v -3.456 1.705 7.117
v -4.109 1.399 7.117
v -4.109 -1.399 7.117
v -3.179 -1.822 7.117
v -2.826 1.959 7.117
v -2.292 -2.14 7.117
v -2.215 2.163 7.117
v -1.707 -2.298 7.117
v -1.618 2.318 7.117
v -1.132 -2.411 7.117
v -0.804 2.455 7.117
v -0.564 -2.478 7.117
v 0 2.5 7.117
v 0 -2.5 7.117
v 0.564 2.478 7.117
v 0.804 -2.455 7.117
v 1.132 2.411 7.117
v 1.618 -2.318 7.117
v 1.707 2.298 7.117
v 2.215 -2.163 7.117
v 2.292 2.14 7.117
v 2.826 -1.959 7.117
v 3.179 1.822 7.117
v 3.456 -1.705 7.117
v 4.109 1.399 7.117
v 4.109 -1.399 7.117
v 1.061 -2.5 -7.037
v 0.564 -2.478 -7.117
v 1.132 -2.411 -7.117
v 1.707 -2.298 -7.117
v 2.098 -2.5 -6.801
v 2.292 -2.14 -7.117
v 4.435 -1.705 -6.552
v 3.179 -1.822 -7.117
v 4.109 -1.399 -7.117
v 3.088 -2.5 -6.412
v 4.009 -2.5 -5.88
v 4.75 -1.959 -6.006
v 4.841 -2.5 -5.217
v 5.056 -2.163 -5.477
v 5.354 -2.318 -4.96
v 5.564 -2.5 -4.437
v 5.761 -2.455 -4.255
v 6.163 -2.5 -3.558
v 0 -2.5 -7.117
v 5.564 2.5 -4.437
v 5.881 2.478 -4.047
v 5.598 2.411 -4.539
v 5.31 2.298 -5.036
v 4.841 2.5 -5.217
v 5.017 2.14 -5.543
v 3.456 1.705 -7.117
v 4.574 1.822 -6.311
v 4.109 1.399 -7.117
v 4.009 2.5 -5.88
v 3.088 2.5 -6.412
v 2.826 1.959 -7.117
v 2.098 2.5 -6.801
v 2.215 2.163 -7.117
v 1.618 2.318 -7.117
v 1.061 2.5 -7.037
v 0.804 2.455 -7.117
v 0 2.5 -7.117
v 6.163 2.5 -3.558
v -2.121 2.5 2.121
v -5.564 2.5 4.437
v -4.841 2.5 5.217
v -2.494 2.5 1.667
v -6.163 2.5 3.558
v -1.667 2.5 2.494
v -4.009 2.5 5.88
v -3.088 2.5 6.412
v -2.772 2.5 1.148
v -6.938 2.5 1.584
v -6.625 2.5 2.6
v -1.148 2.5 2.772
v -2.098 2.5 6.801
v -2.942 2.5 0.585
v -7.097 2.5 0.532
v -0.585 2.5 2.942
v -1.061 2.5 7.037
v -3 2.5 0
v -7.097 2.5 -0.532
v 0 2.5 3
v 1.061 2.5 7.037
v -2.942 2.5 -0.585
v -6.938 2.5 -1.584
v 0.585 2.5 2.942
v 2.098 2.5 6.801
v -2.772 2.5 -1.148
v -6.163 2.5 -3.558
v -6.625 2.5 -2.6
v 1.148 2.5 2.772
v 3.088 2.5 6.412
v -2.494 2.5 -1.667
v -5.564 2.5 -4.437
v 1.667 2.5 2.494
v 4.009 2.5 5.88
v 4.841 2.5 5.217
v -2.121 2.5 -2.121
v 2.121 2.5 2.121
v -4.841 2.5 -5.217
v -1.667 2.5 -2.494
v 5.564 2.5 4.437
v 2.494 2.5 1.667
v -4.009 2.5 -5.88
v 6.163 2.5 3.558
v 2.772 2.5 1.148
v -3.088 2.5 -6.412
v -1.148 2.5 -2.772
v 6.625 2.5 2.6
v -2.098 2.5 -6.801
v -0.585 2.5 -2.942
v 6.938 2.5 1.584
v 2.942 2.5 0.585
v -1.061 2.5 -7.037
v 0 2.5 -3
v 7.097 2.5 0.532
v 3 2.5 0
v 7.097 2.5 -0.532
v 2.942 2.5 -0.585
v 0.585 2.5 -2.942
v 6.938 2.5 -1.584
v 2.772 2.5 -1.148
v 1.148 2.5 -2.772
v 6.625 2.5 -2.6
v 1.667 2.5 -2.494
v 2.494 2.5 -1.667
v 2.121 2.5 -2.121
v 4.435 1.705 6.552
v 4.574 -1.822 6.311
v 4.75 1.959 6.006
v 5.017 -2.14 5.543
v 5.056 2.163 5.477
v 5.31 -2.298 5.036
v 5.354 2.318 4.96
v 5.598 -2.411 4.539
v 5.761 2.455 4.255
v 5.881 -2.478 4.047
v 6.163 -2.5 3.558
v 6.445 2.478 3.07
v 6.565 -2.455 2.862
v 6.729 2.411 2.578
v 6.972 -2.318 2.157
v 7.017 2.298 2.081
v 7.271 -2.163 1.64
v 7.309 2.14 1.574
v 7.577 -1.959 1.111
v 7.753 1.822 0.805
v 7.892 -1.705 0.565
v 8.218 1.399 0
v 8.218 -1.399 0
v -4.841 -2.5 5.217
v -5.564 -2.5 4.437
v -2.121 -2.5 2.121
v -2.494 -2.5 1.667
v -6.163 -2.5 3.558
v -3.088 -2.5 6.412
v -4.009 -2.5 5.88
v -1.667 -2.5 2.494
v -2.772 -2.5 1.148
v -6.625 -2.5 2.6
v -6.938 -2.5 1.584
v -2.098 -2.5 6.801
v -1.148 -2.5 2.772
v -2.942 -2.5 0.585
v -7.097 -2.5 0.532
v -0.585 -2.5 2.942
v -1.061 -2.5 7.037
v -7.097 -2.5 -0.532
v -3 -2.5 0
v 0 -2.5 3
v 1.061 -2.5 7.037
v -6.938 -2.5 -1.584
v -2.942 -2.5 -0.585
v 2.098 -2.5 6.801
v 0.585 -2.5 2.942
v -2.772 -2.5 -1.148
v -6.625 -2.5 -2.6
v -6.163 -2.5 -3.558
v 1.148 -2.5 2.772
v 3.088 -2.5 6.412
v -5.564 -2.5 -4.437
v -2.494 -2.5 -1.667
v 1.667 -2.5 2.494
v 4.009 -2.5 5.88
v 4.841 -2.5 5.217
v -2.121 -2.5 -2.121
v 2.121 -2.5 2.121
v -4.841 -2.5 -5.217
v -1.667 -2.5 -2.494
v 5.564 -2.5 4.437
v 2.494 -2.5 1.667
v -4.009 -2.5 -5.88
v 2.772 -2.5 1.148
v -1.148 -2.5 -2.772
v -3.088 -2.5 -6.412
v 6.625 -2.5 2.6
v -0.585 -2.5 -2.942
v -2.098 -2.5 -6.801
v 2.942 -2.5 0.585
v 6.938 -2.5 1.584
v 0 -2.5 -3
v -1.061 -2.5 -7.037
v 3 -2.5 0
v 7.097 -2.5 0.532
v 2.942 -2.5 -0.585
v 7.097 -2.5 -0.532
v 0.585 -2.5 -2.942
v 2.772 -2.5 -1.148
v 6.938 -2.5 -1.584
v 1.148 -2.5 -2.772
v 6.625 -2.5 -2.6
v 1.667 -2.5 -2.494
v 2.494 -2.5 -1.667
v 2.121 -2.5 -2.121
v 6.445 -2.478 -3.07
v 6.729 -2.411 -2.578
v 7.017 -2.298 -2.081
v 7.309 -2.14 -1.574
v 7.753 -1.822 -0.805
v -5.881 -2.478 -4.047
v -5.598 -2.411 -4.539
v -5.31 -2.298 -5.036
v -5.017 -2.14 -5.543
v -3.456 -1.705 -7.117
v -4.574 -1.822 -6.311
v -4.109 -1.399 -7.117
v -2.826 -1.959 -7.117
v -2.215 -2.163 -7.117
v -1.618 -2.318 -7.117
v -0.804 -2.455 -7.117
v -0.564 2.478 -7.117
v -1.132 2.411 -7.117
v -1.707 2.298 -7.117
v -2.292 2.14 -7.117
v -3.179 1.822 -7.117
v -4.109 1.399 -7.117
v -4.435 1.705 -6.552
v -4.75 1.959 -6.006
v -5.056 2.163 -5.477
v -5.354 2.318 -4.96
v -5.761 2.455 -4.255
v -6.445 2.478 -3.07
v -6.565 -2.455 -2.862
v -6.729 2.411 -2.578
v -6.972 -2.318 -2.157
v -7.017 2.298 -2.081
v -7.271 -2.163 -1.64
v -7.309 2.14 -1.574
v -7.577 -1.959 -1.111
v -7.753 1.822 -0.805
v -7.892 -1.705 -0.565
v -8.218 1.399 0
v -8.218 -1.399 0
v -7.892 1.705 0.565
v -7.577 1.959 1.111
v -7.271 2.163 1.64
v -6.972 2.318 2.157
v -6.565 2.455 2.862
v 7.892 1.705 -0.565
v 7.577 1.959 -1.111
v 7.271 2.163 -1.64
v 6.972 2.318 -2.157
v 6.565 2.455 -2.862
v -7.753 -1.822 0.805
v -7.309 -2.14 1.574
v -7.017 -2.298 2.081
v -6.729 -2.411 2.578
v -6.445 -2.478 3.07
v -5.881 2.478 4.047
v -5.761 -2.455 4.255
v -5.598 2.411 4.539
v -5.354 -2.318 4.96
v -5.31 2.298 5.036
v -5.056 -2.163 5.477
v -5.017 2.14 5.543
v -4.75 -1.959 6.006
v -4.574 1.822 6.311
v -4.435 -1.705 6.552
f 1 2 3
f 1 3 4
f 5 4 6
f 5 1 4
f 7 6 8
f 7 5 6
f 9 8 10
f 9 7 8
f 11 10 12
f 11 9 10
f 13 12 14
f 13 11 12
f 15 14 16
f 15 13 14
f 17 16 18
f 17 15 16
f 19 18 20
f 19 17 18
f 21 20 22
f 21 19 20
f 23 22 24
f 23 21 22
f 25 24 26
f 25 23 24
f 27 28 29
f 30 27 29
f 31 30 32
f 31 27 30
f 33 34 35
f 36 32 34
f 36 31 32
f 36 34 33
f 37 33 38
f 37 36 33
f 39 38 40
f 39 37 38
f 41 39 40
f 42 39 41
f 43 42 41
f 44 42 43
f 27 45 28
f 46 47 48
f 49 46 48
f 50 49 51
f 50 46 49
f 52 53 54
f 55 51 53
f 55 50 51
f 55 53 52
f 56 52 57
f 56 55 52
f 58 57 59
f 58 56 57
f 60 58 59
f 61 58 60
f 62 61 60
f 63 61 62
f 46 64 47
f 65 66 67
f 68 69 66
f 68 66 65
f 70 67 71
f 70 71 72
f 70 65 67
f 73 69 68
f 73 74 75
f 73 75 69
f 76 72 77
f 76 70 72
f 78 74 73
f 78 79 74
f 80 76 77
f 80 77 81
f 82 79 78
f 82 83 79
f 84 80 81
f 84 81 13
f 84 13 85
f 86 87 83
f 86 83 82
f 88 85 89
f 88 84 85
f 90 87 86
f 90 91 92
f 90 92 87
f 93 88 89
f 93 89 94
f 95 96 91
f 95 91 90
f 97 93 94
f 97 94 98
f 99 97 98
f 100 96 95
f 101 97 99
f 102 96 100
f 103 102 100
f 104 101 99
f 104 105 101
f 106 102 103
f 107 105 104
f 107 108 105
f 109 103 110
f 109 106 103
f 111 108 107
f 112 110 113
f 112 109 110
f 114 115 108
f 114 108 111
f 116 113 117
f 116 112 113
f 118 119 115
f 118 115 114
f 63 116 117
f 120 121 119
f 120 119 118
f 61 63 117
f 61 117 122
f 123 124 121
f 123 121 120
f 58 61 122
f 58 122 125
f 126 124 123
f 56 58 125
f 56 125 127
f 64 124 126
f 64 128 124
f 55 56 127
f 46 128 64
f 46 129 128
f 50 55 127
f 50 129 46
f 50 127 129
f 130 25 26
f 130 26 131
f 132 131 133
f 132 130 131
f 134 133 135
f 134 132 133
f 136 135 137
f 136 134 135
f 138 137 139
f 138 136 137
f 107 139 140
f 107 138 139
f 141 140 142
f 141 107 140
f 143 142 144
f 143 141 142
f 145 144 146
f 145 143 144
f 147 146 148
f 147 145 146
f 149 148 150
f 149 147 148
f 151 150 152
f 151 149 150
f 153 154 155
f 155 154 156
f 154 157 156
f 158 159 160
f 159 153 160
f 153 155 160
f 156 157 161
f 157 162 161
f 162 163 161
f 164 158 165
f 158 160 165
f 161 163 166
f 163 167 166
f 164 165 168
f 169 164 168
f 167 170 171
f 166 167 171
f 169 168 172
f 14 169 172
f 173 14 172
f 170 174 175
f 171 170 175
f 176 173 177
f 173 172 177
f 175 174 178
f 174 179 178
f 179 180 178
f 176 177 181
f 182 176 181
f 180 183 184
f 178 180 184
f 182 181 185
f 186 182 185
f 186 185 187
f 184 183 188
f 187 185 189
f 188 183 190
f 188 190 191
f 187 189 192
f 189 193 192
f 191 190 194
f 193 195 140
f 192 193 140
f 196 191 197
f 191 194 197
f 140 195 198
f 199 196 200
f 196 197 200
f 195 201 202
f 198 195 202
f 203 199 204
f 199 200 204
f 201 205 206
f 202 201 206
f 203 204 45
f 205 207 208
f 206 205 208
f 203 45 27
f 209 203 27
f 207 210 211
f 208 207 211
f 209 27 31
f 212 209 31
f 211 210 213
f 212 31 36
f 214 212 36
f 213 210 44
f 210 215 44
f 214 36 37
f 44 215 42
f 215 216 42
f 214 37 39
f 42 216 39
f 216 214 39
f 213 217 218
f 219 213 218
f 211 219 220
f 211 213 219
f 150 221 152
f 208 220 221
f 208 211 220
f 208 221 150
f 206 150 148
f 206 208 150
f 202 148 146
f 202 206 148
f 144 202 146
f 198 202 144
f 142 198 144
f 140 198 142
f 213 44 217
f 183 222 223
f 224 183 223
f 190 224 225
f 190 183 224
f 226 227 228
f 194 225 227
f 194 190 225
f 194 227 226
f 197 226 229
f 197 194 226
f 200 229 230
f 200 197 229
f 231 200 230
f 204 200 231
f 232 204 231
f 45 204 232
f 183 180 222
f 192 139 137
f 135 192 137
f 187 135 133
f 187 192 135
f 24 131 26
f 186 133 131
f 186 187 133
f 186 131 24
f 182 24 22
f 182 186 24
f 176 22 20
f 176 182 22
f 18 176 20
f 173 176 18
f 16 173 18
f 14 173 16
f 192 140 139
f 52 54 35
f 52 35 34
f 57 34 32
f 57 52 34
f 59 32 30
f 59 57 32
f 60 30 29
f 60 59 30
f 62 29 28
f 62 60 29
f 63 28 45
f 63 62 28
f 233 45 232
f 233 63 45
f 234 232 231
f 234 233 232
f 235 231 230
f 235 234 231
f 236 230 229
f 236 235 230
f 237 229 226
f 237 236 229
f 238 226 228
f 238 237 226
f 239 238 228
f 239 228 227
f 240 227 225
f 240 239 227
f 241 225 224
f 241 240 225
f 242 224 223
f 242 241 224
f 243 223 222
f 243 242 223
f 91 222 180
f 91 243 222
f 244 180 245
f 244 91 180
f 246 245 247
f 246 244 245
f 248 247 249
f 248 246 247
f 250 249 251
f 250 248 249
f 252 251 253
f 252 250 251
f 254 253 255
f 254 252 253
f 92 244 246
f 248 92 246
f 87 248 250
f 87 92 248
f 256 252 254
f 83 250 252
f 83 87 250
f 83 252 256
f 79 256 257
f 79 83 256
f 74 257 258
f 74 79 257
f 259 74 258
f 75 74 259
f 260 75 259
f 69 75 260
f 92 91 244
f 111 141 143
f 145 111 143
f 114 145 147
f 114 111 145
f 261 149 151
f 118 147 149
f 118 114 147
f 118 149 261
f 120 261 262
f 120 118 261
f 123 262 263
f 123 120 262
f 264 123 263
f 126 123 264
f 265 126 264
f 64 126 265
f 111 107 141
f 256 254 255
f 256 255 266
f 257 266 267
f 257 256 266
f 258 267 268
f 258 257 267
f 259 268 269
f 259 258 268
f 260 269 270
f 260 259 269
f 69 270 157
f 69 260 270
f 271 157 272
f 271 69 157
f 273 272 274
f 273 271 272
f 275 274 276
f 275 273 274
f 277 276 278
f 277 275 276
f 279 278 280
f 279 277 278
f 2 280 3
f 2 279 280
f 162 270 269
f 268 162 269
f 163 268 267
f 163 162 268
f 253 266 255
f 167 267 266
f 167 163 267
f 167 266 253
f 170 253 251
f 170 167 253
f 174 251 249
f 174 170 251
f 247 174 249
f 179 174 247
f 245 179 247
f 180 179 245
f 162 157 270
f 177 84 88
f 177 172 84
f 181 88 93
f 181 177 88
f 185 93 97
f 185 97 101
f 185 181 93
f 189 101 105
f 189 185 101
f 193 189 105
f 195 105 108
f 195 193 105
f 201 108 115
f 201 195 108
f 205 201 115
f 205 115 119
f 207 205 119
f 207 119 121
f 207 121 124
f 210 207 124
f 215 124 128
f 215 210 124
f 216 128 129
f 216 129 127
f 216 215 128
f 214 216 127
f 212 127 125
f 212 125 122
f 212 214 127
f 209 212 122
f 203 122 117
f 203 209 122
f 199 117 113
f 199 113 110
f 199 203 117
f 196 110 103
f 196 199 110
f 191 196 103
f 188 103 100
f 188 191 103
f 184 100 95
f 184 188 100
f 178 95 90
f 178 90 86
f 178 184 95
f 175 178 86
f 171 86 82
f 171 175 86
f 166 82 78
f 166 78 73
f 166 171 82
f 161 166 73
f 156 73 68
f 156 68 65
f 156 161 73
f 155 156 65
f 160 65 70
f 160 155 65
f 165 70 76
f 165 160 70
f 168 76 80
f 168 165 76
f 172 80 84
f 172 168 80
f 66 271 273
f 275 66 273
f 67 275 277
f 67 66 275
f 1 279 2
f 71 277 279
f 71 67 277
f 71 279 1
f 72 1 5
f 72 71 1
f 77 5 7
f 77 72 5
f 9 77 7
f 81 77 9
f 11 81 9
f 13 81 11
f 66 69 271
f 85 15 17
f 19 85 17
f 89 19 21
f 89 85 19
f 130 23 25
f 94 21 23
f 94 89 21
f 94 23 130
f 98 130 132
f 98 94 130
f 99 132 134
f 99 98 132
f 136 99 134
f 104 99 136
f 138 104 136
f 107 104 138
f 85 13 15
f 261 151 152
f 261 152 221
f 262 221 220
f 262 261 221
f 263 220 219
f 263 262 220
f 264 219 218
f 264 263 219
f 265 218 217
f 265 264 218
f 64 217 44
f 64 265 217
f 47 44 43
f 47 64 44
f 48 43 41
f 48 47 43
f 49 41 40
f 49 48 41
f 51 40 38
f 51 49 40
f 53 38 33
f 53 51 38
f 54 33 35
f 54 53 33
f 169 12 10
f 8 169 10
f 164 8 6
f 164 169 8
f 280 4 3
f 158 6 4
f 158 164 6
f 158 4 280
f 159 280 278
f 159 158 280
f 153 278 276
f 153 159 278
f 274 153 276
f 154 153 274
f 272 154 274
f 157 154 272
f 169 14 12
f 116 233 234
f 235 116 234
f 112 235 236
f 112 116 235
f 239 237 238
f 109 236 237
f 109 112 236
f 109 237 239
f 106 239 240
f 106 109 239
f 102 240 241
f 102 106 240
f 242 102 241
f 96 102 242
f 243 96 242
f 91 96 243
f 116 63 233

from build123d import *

# Parameters (mm, degrees)
SKETCH_1_R          = 3
EXTRUDE_2_DEPTH     = 2.5
SKETCH_4_OUTSIDE_W  = 48.83
SKETCH_4_OUTSIDE_H  = 46.628
SKETCH_4_OUTSIDE_R  = 7.116873297
CUT_EXTRUDE_1_DEPTH = 12.965912678
CUT_EXTRUDE_1_DRAFT = -45
SKETCH_5_OUTSIDE_W  = 48.83
SKETCH_5_OUTSIDE_H  = 46.628
SKETCH_5_OUTSIDE_R  = 7.116873297
CUT_EXTRUDE_2_DEPTH = 12.965912678
CUT_EXTRUDE_2_DRAFT = -45


with BuildPart() as part:
    # 草图1 → 凸台-拉伸2 (new, symmetric)
    with BuildSketch(Plane(origin=(0, 0, 0), x_dir=(1, 0, 0), z_dir=(0, 1, 0))):
        Polygon((8.217857428, 0), (4.108928714, 7.116873297), (-4.108928714, 7.116873297), (-8.217857428, 0), (-4.108928714, -7.116873297), (4.108928714, -7.116873297), align=None)
        with Locations(Location((0, 0, 0), (0, 0, 270))):
            Circle(SKETCH_1_R, mode=Mode.SUBTRACT)
    extrude(amount=EXTRUDE_2_DEPTH, both=True)


with BuildPart() as cut_extrude_1_tool:
    # 草图4 outside → 切除-拉伸1 (with draft: the straight prism first)
    with BuildSketch(Plane(origin=(0, 2.5, 0), x_dir=(1, 0, 0), z_dir=(0, 1, 0))):
        Rectangle(SKETCH_4_OUTSIDE_W, SKETCH_4_OUTSIDE_H)
        Circle(SKETCH_4_OUTSIDE_R, mode=Mode.SUBTRACT)
    extrude(amount=-CUT_EXTRUDE_1_DEPTH)
    # 切除-拉伸1: the draft: its side faces are tilted about the plane it starts from
    cut_extrude_1_sides = [cut_extrude_1_tool.faces().sort_by_distance(p)[0] for p in [
        (0, -3.982956339, 23.314),
        (24.415, -3.982956339, 0),
        (0, -3.982956339, -23.314),
        (-24.415, -3.982956339, 0),
        (-7.116873297, -3.982956339, 0),
    ]]
    draft(cut_extrude_1_sides, Plane(origin=(0, 2.5, 0), x_dir=(1, 0, 0), z_dir=(0, 1, 0)), CUT_EXTRUDE_1_DRAFT)


with BuildPart() as part_1:
    add(part.part)

    # 切除-拉伸1: cut by cut_extrude_1_tool
    add(cut_extrude_1_tool.part, mode=Mode.SUBTRACT)


with BuildPart() as cut_extrude_2_tool:
    # 草图5 outside → 切除-拉伸2 (with draft: the straight prism first)
    with BuildSketch(Plane.XZ.offset(2.5)):
        Rectangle(SKETCH_5_OUTSIDE_W, SKETCH_5_OUTSIDE_H)
        Circle(SKETCH_5_OUTSIDE_R, mode=Mode.SUBTRACT)
    extrude(amount=-CUT_EXTRUDE_2_DEPTH)
    # 切除-拉伸2: the draft: its side faces are tilted about the plane it starts from
    cut_extrude_2_sides = [cut_extrude_2_tool.faces().sort_by_distance(p)[0] for p in [
        (0, 3.982956339, -23.314),
        (24.415, 3.982956339, 0),
        (0, 3.982956339, 23.314),
        (-24.415, 3.982956339, 0),
        (-7.116873297, 3.982956339, 0),
    ]]
    draft(cut_extrude_2_sides, Plane.XZ.offset(2.5), CUT_EXTRUDE_2_DRAFT)


with BuildPart() as part_2:
    add(part_1.part)

    # 切除-拉伸2: cut by cut_extrude_2_tool
    add(cut_extrude_2_tool.part, mode=Mode.SUBTRACT)


solid = part_2.part
